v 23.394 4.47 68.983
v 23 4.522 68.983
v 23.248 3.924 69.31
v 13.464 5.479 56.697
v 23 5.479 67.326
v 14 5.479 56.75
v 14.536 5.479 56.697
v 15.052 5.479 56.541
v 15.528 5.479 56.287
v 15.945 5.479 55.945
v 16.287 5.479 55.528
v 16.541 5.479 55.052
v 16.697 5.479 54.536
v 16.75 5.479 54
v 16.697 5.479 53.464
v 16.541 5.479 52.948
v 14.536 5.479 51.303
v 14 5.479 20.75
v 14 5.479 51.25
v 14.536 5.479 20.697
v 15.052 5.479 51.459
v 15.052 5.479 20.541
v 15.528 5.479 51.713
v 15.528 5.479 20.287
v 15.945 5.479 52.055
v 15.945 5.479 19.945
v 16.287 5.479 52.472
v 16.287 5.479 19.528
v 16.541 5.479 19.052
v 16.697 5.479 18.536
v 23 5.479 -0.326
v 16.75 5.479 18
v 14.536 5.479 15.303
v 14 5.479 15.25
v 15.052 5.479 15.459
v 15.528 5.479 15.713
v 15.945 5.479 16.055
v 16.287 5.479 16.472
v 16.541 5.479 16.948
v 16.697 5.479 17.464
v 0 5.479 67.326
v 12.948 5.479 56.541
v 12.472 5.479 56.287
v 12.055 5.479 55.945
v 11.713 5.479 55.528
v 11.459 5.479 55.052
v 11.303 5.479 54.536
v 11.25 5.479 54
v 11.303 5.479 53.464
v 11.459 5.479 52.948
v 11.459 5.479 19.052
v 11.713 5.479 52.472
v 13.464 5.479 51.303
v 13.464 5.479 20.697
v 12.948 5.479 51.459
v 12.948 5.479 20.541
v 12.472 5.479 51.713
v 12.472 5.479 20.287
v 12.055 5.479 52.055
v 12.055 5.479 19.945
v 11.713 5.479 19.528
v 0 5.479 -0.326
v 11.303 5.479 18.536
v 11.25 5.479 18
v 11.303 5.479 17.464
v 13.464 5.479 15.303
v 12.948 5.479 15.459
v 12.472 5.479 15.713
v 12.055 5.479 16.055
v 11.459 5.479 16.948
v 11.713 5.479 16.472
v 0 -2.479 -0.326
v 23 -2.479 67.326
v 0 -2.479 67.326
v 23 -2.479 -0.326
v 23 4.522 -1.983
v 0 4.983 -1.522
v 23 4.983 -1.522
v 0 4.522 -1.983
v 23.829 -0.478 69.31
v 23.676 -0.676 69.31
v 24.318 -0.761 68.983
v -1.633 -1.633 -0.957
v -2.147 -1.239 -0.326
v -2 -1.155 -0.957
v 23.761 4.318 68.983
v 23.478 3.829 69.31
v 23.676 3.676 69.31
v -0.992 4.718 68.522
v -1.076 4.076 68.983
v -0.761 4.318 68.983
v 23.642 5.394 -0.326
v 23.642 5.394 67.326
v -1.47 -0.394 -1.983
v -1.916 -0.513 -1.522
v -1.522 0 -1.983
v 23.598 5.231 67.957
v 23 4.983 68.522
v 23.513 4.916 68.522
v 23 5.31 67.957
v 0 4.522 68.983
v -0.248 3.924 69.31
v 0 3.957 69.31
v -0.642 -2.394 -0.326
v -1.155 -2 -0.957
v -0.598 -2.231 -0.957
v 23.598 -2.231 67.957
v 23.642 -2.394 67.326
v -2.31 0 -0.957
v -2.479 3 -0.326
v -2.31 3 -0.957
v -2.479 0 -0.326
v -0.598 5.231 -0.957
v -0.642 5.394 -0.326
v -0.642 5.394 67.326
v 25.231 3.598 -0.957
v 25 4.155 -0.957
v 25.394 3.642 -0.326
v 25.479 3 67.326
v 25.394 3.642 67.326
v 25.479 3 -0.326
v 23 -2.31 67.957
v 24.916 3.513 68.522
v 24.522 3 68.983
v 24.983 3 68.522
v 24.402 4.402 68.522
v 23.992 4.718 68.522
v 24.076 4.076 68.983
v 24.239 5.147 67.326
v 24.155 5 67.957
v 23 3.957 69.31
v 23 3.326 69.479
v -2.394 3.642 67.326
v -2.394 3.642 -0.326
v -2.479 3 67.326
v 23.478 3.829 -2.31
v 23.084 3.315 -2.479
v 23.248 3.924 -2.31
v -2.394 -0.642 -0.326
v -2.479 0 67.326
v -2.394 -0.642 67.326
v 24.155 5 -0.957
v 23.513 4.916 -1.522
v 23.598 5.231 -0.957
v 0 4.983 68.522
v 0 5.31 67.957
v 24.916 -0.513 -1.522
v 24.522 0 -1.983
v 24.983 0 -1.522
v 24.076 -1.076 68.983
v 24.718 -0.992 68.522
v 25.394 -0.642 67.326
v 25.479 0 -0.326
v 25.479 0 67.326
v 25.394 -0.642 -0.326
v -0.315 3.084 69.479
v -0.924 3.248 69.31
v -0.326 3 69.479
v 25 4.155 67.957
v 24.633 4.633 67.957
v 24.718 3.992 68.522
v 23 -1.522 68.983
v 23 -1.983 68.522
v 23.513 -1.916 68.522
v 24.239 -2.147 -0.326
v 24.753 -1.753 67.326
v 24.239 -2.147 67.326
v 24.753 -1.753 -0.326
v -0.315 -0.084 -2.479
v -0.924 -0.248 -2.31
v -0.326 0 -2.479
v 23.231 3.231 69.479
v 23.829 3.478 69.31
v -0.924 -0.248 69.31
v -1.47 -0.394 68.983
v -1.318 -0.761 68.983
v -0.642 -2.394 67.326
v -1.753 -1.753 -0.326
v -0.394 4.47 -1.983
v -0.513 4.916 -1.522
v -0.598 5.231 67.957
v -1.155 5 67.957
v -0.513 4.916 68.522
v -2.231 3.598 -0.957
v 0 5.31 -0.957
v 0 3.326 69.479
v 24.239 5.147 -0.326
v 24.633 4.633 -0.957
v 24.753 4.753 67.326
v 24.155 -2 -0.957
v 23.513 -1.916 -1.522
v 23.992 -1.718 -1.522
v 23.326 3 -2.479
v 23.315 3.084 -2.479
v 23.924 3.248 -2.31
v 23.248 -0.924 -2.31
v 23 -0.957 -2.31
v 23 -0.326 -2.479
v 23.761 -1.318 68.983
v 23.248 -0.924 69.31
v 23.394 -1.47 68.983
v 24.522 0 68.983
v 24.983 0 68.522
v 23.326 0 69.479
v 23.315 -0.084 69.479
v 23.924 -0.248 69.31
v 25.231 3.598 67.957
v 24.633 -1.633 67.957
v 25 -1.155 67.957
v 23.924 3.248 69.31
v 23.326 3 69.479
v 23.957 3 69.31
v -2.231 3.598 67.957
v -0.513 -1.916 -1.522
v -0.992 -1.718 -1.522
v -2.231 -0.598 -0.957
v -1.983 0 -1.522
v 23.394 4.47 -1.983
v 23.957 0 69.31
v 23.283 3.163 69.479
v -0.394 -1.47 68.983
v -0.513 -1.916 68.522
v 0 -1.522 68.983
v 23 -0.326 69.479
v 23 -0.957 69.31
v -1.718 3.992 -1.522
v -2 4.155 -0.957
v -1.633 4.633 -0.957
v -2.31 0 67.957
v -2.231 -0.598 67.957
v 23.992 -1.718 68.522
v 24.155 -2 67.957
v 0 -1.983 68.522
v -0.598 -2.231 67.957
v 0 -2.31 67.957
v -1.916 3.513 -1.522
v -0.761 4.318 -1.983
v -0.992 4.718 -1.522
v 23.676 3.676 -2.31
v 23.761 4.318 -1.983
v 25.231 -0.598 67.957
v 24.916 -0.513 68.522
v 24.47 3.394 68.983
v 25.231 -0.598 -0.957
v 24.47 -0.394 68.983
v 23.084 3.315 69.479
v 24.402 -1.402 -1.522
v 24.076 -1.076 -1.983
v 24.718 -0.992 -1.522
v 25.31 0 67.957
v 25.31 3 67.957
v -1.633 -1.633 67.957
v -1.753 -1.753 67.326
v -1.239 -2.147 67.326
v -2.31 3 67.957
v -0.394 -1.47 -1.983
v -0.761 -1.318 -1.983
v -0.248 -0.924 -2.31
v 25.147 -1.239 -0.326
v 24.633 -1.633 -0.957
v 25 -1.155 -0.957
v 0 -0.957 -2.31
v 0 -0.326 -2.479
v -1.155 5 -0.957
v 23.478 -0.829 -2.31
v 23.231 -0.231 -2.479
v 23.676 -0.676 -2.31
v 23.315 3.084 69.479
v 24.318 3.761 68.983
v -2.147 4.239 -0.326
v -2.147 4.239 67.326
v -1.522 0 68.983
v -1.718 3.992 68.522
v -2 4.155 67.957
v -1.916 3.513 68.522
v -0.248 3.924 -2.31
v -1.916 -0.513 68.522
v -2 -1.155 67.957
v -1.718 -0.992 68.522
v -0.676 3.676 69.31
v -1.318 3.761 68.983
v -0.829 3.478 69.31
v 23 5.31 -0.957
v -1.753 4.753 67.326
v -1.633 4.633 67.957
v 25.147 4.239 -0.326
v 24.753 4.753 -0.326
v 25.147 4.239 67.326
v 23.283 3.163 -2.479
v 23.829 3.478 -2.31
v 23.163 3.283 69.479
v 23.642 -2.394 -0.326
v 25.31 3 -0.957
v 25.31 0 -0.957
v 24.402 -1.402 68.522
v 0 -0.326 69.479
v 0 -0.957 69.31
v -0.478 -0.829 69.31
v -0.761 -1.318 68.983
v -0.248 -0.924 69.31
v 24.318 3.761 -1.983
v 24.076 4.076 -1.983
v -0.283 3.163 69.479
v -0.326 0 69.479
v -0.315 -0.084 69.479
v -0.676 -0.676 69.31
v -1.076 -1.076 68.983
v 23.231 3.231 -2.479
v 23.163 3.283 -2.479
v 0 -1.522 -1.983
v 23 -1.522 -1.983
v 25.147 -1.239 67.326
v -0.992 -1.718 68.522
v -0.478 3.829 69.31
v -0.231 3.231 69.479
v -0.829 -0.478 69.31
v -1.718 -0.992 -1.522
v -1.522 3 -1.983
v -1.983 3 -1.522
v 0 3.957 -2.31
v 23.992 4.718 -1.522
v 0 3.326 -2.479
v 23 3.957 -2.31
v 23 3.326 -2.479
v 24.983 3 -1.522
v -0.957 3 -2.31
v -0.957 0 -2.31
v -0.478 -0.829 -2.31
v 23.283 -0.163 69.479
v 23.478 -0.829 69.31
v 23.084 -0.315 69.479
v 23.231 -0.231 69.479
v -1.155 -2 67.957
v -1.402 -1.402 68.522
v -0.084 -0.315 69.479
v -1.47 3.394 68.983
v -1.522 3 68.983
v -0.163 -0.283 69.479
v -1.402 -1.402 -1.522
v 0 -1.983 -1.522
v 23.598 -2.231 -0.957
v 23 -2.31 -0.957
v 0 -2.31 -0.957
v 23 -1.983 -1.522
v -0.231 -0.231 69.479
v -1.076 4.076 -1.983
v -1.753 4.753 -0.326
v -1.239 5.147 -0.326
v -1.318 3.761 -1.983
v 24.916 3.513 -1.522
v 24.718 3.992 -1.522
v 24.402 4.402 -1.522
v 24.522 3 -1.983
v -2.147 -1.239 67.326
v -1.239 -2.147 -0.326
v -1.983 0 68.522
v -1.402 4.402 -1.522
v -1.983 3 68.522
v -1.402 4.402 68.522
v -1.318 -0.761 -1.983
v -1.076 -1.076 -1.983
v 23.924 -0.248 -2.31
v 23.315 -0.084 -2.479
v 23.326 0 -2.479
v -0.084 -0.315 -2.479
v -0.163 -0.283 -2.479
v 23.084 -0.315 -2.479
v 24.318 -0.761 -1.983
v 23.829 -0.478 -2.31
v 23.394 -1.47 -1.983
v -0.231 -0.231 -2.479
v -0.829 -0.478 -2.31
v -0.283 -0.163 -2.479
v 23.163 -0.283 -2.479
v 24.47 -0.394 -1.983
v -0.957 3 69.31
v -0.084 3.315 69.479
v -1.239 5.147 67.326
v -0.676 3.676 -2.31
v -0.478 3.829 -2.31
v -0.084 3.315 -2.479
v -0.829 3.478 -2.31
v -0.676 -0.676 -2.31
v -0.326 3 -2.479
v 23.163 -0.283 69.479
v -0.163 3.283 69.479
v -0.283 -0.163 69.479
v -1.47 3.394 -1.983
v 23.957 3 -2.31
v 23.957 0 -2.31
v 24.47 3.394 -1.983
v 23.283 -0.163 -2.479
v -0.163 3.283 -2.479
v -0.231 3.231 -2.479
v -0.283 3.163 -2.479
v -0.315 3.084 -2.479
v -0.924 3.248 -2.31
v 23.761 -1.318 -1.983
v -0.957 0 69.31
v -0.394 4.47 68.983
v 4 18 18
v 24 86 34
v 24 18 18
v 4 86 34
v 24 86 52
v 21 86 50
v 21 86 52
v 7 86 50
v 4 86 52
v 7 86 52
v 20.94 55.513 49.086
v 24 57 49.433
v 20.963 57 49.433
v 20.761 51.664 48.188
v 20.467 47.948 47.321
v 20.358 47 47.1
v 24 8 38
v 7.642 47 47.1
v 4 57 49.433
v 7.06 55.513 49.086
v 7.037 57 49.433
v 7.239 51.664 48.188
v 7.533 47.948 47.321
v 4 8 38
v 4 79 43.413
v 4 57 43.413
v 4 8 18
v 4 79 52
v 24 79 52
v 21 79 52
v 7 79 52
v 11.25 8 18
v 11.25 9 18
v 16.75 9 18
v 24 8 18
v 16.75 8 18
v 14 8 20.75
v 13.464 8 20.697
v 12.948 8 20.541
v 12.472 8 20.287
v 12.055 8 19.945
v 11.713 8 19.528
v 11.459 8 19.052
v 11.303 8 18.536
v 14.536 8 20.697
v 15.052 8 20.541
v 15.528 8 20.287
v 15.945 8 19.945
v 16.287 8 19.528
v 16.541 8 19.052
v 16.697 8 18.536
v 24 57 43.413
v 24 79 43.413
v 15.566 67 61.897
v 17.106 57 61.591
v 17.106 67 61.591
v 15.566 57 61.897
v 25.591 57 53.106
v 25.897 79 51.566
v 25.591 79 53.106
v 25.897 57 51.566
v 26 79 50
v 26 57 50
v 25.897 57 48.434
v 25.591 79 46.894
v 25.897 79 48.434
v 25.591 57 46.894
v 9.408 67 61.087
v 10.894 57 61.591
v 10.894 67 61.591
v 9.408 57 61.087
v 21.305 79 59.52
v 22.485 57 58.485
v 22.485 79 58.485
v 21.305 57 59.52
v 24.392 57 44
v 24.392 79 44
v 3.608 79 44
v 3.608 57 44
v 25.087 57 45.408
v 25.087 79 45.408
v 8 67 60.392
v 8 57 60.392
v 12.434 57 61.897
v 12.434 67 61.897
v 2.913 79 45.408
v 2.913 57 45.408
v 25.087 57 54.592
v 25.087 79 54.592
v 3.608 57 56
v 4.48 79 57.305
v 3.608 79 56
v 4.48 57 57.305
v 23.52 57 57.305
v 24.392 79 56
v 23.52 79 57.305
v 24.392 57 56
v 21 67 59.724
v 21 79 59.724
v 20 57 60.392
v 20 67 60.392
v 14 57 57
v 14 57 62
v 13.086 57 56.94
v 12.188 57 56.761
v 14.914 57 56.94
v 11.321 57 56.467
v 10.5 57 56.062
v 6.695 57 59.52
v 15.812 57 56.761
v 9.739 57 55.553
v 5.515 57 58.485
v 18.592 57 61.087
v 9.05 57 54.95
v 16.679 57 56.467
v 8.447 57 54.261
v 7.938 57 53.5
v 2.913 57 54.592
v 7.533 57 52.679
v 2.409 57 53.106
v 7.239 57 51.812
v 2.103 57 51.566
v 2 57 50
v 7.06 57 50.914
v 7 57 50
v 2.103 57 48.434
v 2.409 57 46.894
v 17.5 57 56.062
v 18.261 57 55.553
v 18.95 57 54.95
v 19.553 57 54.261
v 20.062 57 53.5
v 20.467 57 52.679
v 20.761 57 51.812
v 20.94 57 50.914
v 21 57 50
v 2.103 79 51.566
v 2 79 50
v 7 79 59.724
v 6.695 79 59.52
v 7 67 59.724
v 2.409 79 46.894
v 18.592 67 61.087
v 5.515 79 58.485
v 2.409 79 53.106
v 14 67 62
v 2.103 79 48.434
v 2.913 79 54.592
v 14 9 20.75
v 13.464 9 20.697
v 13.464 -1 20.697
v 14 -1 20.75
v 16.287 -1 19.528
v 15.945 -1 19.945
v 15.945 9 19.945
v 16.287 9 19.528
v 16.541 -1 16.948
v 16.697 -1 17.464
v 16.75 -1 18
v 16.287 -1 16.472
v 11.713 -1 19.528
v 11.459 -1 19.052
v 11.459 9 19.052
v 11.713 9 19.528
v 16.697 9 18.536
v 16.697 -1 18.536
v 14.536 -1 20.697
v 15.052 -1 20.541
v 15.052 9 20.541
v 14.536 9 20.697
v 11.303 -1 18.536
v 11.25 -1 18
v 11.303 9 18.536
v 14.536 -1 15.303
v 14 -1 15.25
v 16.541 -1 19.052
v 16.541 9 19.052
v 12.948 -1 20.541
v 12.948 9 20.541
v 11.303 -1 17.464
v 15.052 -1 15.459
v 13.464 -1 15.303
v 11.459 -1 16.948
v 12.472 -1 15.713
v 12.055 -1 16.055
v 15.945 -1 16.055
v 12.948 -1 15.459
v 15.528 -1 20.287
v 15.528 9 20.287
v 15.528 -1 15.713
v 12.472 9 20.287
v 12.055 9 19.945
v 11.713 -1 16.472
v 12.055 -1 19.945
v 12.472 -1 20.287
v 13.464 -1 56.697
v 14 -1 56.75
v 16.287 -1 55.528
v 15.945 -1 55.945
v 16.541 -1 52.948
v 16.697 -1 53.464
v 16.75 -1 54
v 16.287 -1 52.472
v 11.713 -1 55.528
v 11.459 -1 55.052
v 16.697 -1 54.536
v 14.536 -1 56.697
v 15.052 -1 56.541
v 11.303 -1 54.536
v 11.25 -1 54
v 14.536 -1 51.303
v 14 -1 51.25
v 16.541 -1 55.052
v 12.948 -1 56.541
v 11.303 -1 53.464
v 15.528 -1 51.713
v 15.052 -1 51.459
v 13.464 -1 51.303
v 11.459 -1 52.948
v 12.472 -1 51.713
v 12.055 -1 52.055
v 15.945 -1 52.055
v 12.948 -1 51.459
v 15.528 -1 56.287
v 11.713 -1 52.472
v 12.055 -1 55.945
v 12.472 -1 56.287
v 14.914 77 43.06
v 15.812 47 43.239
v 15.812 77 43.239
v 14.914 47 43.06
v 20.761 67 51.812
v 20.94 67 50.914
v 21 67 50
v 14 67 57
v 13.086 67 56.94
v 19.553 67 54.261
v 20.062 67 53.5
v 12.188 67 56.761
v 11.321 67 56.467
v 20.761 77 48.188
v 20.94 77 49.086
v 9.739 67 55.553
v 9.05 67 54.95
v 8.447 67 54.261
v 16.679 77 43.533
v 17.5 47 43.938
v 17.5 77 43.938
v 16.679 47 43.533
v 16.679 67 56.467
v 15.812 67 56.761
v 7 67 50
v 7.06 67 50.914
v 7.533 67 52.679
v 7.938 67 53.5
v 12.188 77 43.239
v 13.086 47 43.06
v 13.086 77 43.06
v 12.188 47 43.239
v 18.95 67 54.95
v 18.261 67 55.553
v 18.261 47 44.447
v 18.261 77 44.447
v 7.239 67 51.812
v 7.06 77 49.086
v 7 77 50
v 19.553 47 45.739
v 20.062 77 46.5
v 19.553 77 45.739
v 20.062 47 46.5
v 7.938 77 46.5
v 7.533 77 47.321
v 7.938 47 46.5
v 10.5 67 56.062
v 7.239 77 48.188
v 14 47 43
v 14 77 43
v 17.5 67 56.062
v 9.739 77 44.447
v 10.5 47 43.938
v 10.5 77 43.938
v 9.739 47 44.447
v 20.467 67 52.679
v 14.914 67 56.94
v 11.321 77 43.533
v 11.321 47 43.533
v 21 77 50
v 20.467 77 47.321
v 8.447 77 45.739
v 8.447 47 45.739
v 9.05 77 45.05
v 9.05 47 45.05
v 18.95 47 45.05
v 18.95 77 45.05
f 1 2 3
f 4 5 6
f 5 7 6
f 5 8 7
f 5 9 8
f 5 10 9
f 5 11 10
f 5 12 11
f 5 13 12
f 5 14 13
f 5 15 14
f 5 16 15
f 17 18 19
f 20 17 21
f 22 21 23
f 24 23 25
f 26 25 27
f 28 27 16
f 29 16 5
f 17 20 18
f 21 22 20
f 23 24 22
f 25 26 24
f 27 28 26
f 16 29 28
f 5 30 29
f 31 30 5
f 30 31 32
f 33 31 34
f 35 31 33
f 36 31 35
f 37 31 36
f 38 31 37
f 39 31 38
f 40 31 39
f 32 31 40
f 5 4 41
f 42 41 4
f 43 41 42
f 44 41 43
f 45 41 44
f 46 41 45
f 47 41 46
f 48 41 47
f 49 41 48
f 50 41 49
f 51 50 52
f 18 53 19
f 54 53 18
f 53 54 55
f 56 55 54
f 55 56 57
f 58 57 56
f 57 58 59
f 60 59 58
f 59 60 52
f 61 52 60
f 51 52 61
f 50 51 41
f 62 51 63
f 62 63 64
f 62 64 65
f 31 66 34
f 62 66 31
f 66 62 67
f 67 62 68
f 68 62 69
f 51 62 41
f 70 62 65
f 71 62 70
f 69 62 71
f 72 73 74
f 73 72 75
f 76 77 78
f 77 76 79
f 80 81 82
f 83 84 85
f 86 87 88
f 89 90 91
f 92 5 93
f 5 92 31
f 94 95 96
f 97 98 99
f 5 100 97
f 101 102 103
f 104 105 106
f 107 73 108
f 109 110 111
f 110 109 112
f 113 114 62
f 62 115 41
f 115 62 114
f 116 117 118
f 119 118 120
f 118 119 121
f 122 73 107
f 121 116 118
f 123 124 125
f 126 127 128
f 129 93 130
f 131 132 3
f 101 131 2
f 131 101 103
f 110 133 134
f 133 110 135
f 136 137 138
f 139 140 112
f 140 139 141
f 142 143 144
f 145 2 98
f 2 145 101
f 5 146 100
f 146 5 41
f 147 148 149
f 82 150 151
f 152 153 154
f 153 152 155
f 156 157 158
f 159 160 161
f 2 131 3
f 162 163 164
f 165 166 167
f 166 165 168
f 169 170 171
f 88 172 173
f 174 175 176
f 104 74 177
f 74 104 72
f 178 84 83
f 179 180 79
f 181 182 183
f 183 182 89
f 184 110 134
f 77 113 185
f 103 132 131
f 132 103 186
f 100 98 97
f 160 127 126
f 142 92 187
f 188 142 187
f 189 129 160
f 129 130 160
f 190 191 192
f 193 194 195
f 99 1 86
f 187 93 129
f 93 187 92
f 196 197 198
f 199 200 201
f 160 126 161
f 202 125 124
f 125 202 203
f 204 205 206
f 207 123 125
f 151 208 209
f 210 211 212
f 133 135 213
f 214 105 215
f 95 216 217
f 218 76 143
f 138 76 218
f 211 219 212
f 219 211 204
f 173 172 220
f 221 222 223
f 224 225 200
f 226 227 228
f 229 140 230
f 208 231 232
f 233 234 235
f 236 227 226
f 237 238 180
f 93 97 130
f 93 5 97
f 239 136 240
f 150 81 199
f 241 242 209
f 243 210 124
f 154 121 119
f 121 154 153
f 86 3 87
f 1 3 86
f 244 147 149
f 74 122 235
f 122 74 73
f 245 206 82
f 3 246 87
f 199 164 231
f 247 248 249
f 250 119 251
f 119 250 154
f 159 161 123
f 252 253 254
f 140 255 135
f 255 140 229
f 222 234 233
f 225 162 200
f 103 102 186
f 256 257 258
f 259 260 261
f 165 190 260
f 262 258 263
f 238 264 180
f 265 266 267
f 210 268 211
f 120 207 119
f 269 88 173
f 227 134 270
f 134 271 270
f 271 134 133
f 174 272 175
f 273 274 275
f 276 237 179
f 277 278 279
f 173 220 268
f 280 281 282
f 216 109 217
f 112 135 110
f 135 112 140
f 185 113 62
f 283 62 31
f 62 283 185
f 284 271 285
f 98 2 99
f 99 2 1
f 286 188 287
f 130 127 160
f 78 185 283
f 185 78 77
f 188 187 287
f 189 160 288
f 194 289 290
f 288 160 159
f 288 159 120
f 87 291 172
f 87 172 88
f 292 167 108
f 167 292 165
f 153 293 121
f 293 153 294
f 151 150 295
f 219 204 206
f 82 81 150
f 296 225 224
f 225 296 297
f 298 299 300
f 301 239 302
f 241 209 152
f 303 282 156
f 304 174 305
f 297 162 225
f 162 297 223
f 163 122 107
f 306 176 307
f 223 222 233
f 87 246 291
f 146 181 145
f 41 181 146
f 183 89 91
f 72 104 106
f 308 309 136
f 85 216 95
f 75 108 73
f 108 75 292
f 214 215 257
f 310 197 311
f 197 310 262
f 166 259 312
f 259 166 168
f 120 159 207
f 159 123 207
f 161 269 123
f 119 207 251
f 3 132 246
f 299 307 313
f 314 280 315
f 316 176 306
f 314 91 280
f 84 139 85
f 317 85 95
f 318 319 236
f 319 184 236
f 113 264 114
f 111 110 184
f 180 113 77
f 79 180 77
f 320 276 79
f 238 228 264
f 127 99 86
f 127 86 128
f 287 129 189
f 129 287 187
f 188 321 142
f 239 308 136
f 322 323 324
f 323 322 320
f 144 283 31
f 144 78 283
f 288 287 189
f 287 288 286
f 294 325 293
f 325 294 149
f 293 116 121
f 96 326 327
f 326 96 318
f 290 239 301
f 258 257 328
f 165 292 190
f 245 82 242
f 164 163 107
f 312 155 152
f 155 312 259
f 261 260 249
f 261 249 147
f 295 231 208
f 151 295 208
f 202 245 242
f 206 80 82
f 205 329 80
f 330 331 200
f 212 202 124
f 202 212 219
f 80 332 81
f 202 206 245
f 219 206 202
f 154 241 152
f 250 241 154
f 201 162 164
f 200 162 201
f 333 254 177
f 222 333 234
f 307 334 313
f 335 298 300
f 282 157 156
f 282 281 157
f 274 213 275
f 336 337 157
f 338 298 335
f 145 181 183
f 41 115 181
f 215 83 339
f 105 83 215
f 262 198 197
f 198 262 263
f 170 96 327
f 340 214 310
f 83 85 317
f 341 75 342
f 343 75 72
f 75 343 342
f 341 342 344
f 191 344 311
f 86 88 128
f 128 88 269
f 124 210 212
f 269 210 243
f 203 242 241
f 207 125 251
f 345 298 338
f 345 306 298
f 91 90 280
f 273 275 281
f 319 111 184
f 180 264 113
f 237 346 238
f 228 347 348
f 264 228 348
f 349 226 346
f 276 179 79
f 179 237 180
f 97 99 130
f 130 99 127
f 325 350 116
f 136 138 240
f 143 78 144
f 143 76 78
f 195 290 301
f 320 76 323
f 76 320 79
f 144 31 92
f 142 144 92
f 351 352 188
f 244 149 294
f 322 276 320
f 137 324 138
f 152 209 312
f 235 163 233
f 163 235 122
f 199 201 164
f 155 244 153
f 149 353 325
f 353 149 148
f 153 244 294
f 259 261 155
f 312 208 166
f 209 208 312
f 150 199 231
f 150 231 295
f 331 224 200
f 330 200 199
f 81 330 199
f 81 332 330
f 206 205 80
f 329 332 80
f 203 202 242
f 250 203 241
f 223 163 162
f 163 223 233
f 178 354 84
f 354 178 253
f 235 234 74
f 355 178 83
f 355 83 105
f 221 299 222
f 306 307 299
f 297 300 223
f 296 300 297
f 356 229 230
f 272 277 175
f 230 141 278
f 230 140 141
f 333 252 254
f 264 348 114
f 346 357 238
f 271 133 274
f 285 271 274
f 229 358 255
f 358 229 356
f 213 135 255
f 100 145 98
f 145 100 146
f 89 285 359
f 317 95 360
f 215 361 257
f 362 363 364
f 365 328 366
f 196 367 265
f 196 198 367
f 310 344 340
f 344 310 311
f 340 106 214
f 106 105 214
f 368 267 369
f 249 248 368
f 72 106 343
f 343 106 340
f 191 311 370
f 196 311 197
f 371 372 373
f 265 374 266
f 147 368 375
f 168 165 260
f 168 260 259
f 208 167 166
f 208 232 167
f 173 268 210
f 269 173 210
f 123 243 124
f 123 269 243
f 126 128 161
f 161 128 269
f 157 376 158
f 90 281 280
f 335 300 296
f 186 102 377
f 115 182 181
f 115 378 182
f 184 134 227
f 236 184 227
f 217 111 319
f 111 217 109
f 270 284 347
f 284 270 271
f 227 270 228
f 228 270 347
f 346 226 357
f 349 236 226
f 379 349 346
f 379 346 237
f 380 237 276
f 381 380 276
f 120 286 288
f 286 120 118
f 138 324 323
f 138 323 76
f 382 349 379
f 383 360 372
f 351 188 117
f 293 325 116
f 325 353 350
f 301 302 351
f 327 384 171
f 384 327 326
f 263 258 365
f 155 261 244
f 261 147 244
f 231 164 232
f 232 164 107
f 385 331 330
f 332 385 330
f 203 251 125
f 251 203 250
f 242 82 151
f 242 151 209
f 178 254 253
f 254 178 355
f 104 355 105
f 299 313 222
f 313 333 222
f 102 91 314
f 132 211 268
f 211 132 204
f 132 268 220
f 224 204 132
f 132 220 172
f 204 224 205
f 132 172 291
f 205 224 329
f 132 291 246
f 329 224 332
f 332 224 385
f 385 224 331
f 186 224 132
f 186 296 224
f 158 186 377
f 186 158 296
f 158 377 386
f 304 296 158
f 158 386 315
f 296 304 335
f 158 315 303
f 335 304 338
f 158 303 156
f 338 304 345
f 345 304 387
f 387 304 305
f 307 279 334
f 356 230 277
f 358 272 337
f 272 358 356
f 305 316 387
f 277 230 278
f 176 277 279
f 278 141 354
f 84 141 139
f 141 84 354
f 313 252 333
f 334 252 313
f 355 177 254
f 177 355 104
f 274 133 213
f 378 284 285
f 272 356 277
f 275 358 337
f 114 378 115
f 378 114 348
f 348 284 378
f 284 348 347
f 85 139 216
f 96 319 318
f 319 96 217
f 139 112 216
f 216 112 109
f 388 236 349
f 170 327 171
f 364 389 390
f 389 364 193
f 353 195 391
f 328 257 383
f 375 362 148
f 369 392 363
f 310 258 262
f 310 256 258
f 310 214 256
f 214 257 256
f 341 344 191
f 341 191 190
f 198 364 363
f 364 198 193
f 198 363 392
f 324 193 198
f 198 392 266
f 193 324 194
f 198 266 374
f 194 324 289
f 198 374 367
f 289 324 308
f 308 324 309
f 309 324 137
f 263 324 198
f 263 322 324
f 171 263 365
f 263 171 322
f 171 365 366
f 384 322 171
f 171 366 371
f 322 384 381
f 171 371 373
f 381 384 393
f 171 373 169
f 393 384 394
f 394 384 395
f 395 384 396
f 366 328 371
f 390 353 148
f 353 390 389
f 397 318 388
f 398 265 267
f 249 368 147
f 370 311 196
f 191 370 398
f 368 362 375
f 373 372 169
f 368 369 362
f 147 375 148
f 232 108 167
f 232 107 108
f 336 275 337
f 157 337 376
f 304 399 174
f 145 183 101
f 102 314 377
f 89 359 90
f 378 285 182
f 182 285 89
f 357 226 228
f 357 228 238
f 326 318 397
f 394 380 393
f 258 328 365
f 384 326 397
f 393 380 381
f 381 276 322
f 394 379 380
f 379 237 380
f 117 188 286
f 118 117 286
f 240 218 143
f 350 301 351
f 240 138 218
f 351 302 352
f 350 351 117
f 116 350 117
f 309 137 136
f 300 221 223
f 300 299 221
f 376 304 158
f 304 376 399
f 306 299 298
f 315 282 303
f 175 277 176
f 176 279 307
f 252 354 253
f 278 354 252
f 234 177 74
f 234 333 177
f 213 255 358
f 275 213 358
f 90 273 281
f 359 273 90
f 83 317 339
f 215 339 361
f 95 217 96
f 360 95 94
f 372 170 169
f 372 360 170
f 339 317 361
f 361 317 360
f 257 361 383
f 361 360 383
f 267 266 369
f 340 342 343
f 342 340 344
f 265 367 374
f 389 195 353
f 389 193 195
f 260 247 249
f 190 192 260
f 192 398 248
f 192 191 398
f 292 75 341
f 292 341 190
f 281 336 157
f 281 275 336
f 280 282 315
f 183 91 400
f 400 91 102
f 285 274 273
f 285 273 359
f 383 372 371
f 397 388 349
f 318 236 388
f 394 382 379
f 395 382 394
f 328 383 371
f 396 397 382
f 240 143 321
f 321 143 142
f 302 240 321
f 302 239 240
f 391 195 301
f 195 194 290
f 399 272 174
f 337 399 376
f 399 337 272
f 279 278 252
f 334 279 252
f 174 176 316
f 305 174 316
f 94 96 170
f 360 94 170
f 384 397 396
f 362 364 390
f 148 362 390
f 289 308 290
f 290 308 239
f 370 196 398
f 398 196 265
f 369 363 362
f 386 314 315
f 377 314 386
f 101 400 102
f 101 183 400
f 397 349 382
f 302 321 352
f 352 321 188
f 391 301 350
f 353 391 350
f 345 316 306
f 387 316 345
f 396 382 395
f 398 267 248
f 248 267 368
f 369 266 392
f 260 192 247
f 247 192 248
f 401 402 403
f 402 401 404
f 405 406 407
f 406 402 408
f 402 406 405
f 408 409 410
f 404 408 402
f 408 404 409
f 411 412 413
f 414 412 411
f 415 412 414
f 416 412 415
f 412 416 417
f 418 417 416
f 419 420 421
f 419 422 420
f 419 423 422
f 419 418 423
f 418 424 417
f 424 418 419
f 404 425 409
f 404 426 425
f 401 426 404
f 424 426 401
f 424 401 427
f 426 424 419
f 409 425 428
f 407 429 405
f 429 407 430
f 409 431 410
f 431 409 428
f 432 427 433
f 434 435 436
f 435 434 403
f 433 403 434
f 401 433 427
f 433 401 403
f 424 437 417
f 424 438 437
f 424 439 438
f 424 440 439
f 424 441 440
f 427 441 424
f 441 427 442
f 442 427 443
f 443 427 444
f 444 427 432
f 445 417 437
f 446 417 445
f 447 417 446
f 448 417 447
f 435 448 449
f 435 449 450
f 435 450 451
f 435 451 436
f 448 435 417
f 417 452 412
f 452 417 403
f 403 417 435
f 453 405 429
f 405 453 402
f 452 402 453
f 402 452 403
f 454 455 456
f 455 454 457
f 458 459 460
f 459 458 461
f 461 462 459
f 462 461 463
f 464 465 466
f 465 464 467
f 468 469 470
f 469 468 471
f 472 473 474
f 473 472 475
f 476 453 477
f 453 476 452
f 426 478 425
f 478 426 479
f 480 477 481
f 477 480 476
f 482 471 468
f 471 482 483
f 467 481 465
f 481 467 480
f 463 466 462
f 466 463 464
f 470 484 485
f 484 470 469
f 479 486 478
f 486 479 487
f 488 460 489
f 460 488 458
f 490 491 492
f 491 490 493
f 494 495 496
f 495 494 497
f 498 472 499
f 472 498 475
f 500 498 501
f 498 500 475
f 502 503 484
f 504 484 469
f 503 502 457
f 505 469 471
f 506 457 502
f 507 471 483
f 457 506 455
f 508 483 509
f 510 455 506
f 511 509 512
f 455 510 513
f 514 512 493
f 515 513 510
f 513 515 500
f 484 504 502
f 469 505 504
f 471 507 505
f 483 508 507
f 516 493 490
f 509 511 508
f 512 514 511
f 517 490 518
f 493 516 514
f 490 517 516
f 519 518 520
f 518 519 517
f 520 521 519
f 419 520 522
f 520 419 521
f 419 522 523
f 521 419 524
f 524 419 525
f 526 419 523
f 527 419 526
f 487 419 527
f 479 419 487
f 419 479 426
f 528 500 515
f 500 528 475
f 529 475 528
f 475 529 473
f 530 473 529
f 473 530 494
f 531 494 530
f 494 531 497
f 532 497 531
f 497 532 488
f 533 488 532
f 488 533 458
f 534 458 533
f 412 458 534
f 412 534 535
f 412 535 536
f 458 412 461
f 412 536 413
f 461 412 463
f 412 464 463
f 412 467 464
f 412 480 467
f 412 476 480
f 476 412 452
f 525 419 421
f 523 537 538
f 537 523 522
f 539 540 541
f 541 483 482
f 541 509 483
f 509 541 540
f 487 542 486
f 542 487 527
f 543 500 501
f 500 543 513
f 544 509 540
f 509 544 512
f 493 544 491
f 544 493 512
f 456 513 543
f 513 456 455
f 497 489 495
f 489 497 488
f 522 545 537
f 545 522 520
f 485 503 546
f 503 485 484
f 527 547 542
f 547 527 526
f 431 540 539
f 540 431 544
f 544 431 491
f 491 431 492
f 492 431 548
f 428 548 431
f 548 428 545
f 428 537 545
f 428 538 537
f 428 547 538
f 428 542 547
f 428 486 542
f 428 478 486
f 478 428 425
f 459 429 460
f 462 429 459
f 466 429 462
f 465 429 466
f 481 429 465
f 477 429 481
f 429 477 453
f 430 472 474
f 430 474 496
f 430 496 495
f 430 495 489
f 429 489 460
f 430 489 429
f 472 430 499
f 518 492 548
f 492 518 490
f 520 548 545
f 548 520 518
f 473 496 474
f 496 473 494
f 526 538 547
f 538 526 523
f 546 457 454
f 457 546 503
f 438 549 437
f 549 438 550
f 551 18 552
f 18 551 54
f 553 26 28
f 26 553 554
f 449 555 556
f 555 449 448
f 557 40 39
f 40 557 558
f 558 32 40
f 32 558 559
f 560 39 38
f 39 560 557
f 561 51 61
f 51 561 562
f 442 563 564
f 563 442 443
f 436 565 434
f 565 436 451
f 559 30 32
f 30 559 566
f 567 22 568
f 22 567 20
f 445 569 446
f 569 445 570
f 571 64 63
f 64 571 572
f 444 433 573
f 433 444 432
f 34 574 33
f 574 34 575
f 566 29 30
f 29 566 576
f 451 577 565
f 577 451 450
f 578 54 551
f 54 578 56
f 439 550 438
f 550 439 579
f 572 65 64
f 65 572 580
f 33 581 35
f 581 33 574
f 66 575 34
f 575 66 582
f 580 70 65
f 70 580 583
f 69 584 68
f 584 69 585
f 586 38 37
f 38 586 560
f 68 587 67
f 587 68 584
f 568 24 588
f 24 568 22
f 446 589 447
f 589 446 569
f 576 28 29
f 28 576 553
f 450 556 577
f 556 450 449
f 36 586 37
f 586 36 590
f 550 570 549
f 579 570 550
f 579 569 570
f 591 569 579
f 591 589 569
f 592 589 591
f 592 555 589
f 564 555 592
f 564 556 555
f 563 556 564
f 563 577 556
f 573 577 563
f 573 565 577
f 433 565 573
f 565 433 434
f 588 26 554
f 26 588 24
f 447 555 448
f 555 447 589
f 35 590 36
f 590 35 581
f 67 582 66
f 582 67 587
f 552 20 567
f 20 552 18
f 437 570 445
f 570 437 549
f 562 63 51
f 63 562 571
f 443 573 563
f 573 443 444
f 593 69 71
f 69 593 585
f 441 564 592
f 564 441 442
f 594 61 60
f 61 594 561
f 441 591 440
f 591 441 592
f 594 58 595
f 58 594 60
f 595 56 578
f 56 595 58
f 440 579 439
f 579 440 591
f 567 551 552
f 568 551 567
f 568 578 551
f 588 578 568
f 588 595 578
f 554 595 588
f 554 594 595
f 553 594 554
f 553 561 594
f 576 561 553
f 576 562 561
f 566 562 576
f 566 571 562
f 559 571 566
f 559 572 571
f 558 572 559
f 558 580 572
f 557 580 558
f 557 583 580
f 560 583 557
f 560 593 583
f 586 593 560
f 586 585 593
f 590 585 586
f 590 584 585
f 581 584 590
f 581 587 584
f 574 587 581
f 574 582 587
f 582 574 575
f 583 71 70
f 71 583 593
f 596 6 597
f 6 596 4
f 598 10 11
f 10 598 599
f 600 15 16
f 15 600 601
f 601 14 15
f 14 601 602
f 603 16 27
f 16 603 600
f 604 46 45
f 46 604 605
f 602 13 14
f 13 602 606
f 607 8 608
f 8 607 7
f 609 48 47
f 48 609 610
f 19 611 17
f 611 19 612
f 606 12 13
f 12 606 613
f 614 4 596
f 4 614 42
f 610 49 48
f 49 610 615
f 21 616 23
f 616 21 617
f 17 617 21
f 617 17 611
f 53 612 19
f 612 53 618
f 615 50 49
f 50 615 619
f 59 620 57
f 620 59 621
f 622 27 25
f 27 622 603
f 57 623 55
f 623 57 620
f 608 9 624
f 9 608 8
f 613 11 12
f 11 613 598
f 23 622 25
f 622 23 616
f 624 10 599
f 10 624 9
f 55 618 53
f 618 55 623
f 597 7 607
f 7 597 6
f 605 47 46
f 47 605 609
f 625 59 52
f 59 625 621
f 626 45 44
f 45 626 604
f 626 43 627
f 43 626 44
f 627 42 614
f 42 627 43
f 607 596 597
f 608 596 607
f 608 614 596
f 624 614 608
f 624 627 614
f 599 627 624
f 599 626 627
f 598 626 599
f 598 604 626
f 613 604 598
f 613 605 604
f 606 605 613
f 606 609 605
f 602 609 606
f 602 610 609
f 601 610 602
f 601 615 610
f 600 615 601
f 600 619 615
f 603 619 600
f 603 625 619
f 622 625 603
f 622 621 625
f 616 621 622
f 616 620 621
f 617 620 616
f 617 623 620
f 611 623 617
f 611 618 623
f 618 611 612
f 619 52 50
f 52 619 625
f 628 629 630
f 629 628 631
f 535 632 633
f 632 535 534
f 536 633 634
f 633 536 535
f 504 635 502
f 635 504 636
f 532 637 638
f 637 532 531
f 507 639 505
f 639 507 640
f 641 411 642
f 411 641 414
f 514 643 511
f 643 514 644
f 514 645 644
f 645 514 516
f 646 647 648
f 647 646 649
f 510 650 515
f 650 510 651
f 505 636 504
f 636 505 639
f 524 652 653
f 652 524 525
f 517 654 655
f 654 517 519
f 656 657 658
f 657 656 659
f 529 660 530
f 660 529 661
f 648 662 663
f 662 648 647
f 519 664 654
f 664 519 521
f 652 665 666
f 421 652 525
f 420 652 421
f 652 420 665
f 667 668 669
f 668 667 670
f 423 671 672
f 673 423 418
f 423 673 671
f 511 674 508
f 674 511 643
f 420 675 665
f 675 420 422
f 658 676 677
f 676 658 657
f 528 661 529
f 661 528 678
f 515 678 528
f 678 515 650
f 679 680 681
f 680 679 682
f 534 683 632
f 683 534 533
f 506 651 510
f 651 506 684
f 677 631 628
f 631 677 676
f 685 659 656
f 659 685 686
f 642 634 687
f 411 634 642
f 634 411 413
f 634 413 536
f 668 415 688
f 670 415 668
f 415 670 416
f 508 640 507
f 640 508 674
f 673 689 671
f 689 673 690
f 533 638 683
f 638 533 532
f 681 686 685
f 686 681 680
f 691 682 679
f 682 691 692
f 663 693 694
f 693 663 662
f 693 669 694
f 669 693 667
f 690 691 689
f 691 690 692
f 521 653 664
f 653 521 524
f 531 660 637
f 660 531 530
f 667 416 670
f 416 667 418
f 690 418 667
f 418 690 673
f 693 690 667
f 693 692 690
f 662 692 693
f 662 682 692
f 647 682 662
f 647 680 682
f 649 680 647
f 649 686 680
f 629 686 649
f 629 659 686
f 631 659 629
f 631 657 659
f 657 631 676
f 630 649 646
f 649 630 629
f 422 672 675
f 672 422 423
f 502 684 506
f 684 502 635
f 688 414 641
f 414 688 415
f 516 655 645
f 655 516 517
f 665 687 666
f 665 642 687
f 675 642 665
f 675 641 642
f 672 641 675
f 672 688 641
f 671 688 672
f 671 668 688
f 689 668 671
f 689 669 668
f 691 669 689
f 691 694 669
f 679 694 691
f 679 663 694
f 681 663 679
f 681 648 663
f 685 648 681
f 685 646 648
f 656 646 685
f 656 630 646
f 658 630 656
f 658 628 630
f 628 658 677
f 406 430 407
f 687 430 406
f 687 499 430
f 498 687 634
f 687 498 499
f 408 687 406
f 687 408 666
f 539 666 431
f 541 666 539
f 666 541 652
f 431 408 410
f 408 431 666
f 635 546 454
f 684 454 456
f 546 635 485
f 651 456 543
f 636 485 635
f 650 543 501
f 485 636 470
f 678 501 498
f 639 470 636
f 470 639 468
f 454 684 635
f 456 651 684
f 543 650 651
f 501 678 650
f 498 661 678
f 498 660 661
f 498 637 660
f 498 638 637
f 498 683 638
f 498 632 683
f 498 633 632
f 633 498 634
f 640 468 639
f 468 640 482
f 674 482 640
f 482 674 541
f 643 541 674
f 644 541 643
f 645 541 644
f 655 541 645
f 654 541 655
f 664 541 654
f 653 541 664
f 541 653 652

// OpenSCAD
// file: ../config/TF3D-SDC-01_dimensions.scad
// TriFusión 3D – Smart Dry Cabinet
// Modelo TF3D-SDC-01 | Sprint 3.2 | Rev A
// Unidades: mm

CABINET_W = 800;
CABINET_H = 1000;
CABINET_D = 500;
BOARD_T = 18;

INNER_W = CABINET_W - 2*BOARD_T;
INNER_H = CABINET_H - 2*BOARD_T;

BACK_W = INNER_W;
BACK_H = INNER_H;
BACK_T = BOARD_T;

// Compartimento técnico inferior
TECH_H = 160;
TECH_LID_Z = TECH_H;

// Puerta sobrepuesta
DOOR_GAP = 3;
DOOR_W = CABINET_W - 2*DOOR_GAP;
DOOR_H = CABINET_H - 2*DOOR_GAP;
DOOR_FRAME = 30;
DOOR_FRAME_D = 20;
ACRYLIC_T = 6;
EPDM_T = 4;

// Soportes de carrete
SPOOL_ROWS = 4;
SPOOLS_PER_ROW = 4;
SPOOL_CENTERS_X = [110, 300, 490, 680];
SPOOL_ROWS_Z = [270, 475, 680, 885];
SUPPORT_PAIR_GAP = 82; // separación entre soportes de una misma bobina
ROD_D = 10;
ROD_L = 120;

// Soporte impreso
SUPPORT_W = 28;
SUPPORT_H = 72;
SUPPORT_D = 92;
MOUNT_T = 8;
CRADLE_R = 7;

// Ventilador previsto
FAN_SIZE = 120;
FAN_HOLE_SPACING = 105;
FAN_HOLE_D = 4.5;

// Apariencia
MELAMINE = [0.94,0.94,0.94];
PRINTED = [0.08,0.25,0.75];
METAL = [0.12,0.12,0.12];
ACRYLIC = [0.55,0.82,1.0,0.25];
SEAL = [0.05,0.05,0.05];
// file: ../config/common.scad
include <TF3D-SDC-01_dimensions.scad>

module board(size=[100,100,18], c=MELAMINE) {
    color(c) cube(size, center=false);
}

module rod(length=ROD_L, diameter=ROD_D) {
    color([0.65,0.65,0.68])
        rotate([0,90,0])
            cylinder(h=length, d=diameter, $fn=48);
}

module rounded_box(size=[20,20,20], r=3) {
    minkowski() {
        cube([size[0]-2*r,size[1]-2*r,size[2]-2*r]);
        sphere(r=r,$fn=24);
    }
}
// main file
include <../config/common.scad>

// Soporte individual inspirado en la referencia proporcionada por el usuario.
// Imprimir dos unidades por carrete.
// Material recomendado de prototipo: PETG.
// Orientación recomendada: placa de montaje sobre la cama.

module spool_support() {
    difference() {
        union() {
            // placa de montaje
            rounded_box([SUPPORT_W, MOUNT_T, SUPPORT_H], 2.5);

            // brazo inclinado
            hull() {
                translate([4,MOUNT_T,18])
                    cube([SUPPORT_W-8,10,20]);
                translate([4,SUPPORT_D-24,34])
                    cube([SUPPORT_W-8,18,18]);
            }

            // cuna semicircular para varilla
            translate([SUPPORT_W/2,SUPPORT_D-13,50])
                rotate([90,0,0])
                    cylinder(h=22,r=CRADLE_R+5,$fn=48);
        }

        // cavidad de la varilla
        translate([SUPPORT_W/2,SUPPORT_D-15,50])
            rotate([90,0,0])
                cylinder(h=30,r=CRADLE_R,$fn=48);

        // apertura superior de la cuna
        translate([SUPPORT_W/2-CRADLE_R,SUPPORT_D-25,50])
            cube([2*CRADLE_R,30,25]);

        // orificios M5 de montaje
        for (z=[18,54])
            translate([SUPPORT_W/2,-1,z])
                rotate([-90,0,0])
                    cylinder(h=MOUNT_T+2,d=5.5,$fn=32);
    }
}

spool_support();
